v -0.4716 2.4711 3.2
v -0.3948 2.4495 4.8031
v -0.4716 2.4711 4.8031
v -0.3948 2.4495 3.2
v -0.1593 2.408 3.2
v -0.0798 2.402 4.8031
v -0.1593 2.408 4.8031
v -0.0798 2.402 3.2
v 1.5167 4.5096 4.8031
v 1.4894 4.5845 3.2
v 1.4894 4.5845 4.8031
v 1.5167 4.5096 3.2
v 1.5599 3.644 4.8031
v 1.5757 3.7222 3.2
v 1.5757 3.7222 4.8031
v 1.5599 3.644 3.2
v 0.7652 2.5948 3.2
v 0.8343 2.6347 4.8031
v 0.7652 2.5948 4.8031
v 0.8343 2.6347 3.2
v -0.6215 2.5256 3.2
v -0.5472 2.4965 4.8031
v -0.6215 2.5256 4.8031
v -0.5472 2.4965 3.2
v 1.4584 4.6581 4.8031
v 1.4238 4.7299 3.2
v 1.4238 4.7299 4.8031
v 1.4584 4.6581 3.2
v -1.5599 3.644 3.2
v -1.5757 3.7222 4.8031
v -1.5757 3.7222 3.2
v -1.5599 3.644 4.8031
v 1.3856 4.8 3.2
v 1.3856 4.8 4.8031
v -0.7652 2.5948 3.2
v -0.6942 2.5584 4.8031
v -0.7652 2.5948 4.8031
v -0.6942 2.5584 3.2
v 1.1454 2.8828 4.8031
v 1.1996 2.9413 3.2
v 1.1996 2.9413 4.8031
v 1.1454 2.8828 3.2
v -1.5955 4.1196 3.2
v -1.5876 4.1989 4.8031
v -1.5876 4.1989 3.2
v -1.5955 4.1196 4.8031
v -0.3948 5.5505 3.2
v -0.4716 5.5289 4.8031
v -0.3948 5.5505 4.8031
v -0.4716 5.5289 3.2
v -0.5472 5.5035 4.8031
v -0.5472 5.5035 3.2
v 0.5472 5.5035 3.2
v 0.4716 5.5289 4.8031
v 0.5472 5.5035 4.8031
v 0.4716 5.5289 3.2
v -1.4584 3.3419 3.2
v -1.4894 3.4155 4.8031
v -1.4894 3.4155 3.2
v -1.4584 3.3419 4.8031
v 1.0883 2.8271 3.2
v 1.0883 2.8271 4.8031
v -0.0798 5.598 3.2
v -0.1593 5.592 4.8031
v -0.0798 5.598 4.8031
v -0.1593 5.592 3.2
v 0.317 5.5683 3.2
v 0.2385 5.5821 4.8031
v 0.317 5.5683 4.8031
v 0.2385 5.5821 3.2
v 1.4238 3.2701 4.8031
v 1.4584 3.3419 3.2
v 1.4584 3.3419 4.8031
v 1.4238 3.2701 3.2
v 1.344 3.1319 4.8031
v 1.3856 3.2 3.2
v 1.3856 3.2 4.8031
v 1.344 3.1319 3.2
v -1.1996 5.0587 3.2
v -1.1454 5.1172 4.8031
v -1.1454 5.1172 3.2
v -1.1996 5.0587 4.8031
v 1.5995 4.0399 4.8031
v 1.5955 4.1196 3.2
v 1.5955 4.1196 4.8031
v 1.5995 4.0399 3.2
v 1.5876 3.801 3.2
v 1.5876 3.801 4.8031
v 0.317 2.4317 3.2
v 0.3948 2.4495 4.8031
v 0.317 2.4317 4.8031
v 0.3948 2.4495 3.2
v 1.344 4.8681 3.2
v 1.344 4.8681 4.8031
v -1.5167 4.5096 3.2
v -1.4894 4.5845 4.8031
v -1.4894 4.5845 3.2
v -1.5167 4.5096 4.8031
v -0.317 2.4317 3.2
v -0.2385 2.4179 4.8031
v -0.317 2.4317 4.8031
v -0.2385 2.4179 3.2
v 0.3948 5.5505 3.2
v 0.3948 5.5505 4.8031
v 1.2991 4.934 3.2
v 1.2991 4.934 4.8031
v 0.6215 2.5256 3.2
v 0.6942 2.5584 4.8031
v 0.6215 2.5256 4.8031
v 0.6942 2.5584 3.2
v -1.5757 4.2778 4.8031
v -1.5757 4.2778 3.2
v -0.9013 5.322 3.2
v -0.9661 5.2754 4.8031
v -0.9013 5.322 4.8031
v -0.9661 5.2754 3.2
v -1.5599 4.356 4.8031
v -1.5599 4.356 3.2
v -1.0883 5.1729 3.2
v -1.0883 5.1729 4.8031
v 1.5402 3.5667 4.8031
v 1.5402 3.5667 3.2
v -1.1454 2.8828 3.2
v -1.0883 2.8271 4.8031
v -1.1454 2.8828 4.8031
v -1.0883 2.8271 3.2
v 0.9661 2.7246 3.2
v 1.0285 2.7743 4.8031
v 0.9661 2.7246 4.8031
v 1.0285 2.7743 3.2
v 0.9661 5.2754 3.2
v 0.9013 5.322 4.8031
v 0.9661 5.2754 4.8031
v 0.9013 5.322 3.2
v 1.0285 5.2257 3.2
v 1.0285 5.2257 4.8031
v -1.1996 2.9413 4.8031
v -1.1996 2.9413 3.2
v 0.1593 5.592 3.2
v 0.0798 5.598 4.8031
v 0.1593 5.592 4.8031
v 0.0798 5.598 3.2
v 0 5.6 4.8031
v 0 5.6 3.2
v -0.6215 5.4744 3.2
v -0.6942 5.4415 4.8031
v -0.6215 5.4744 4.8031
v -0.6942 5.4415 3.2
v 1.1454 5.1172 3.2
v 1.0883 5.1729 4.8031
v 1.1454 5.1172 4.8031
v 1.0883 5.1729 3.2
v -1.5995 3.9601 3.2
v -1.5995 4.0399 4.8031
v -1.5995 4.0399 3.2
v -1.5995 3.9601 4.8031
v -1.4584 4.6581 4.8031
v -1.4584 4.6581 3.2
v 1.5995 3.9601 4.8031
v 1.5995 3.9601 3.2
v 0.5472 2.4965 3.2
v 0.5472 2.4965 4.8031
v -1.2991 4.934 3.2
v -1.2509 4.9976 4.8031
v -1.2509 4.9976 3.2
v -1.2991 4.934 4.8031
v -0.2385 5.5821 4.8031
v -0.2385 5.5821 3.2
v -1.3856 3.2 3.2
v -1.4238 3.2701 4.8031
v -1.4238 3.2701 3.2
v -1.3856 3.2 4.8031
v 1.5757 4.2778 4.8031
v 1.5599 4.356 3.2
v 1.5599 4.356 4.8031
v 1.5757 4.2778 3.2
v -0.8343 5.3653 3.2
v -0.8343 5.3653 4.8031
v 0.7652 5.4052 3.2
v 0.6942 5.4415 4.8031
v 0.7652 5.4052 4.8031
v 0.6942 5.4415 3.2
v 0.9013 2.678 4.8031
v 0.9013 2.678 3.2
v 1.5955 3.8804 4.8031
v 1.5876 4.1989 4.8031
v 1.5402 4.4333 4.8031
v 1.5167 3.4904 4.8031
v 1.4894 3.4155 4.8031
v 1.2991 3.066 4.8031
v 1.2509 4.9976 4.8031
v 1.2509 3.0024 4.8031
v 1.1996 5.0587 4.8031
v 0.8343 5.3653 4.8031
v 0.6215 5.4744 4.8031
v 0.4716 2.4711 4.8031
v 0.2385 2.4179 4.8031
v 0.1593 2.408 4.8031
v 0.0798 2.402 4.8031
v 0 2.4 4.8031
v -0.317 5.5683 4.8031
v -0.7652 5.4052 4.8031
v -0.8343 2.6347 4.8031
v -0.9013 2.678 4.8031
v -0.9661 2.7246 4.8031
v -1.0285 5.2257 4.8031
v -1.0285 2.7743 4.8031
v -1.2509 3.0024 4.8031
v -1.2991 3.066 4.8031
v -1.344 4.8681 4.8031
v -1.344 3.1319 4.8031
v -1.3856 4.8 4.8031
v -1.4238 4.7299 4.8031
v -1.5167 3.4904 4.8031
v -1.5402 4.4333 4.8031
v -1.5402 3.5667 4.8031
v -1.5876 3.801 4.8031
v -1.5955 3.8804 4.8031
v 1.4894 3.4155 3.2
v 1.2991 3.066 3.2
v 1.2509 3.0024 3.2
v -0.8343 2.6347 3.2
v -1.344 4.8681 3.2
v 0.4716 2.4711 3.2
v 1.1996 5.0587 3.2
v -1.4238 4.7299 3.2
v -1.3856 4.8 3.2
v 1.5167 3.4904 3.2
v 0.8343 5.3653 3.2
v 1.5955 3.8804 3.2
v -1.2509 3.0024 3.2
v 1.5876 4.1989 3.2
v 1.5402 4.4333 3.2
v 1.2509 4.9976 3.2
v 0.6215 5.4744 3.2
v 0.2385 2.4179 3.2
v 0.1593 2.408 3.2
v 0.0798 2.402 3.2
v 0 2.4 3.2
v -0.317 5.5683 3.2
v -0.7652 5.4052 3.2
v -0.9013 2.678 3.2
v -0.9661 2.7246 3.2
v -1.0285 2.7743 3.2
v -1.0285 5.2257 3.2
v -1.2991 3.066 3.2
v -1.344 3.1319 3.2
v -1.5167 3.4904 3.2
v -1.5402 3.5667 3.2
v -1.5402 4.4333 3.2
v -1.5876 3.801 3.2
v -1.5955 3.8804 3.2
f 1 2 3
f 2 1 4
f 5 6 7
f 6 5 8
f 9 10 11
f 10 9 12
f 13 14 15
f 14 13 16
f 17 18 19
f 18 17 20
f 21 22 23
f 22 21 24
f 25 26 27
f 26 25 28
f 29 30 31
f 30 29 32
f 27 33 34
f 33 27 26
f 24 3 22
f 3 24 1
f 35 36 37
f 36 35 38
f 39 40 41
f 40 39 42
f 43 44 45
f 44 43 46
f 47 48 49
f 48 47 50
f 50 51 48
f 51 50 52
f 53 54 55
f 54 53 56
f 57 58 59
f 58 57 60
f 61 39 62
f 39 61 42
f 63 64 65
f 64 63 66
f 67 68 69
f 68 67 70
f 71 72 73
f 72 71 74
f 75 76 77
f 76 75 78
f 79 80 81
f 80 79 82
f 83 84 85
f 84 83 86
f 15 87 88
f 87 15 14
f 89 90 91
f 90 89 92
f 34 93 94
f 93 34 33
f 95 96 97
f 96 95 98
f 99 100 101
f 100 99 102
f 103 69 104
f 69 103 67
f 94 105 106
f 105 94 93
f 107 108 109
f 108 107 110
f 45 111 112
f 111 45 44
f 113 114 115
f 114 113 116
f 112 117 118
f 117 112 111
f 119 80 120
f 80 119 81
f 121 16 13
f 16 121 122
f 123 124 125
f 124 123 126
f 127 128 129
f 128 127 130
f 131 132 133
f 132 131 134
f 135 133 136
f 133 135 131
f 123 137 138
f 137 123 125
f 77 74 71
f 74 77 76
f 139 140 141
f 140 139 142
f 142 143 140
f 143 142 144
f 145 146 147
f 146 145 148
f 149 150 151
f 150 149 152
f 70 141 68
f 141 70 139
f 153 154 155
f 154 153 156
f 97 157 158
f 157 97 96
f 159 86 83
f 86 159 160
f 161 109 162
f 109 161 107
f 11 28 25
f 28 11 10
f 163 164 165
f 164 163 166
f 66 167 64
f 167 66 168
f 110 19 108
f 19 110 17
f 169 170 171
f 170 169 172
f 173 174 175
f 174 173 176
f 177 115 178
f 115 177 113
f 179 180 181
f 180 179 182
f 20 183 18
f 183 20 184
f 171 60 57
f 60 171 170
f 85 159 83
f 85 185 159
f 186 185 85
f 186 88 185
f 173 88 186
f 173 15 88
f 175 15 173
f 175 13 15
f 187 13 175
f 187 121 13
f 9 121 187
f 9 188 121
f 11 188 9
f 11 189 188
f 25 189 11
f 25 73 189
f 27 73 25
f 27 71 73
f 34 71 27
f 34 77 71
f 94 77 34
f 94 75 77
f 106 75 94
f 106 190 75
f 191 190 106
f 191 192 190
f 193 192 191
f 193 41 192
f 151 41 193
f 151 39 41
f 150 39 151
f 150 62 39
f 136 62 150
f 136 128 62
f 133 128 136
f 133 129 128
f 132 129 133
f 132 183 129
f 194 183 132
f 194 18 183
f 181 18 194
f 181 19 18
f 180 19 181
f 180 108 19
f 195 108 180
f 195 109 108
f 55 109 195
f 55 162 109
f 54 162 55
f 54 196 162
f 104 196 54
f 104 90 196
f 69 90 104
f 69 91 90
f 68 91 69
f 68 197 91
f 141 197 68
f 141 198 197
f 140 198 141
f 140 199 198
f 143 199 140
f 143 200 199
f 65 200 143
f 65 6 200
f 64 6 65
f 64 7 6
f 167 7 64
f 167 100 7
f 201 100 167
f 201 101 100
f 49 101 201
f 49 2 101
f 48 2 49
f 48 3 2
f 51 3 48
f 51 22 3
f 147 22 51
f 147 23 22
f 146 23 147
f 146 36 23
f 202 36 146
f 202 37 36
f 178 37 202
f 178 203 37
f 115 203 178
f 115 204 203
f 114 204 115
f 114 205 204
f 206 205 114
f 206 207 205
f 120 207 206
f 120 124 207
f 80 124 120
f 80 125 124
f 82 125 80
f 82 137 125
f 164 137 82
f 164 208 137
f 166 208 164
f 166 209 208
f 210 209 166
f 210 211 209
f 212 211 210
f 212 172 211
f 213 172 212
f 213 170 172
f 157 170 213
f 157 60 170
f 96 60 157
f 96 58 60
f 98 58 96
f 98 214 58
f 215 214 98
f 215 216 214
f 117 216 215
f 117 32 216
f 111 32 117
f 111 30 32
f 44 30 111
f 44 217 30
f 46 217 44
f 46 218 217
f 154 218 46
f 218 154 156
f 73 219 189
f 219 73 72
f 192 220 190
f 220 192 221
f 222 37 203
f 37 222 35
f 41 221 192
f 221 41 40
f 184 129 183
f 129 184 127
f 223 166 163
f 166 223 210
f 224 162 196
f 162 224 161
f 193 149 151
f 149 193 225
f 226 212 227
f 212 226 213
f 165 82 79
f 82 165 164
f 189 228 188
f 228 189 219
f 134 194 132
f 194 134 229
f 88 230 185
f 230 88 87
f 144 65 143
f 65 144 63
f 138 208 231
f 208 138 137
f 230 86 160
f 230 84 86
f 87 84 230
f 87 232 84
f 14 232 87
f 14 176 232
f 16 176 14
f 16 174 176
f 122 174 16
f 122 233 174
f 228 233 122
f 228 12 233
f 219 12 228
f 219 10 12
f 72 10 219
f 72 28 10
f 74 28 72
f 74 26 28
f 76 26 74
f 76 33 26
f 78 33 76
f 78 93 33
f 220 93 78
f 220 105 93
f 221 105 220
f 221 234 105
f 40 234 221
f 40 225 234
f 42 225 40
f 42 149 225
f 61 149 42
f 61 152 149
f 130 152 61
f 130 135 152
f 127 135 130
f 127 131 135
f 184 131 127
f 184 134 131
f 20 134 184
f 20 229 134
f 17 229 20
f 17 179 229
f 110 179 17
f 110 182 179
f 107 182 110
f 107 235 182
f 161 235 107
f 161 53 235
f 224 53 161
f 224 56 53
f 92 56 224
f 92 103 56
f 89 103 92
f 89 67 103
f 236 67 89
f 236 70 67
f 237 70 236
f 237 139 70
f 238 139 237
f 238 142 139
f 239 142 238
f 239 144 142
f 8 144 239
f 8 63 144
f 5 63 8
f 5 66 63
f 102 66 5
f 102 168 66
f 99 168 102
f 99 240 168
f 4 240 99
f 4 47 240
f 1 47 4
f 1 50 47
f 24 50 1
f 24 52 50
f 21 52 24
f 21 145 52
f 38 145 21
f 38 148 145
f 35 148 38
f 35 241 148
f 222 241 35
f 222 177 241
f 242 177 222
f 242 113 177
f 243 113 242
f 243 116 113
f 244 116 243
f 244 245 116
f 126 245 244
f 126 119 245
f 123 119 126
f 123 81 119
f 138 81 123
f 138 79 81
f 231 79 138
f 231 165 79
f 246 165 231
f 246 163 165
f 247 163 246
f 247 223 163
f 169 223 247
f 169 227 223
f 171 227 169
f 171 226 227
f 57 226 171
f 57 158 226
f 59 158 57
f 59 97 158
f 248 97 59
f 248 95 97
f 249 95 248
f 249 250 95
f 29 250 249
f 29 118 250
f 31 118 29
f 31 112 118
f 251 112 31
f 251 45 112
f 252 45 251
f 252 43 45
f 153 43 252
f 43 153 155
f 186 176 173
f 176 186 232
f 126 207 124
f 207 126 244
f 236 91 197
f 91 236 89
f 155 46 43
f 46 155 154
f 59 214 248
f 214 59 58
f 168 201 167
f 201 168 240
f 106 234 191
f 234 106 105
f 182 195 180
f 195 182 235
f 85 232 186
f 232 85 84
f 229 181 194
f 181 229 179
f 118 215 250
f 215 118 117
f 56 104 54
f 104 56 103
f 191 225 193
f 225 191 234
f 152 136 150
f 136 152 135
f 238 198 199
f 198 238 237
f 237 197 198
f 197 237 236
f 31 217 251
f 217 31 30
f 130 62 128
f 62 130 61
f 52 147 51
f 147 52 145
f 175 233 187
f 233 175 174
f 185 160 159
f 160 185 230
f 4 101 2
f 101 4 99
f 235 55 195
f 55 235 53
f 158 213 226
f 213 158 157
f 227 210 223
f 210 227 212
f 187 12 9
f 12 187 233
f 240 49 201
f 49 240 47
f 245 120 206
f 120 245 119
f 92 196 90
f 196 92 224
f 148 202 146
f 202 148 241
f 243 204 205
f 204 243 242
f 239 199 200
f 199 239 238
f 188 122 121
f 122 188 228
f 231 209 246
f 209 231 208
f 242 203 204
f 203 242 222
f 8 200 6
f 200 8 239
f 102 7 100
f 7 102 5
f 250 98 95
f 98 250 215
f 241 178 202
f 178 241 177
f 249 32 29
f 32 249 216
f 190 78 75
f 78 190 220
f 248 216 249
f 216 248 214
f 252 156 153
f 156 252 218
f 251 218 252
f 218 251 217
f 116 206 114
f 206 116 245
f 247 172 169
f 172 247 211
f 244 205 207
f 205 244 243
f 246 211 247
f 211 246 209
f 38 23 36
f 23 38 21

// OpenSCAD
use <../lib.scad>
use <s/15068s01.scad>
$fa=1; $fs=0.2;
function ldraw_lib__15068p05(realsolid=false) = [
// 0 Slope Brick Curved  2 x  2 x  0.667 with "MUSEUM" Pattern
// 0 Name: 15068p05.dat
// 0 Author: Philippe Hurbain [Philo]
// 0 !LDRAW_ORG Part UPDATE 2017-01
// 0 !LICENSE Licensed under CC BY 2.0 and CC BY 4.0 : see CAreadme.txt
// 
// 0 BFC CERTIFY CCW
  [0,"BFC","CERTIFY"],
  [0,"BFC","CCW"],
// 
// 0 !KEYWORDS Architecture, Set 21035, Solomon Guggenheim
// 
// 0 !HISTORY 2017-12-30 [PTadmin] Official Update 2017-01
// 
// 
// 1 16 0 0 0 1 0 0 0 1 0 0 0 1 s\15068s01.dat
  [1,16,0,0,0,1,0,0,0,1,0,0,0,1, ldraw_lib__s__15068s01(realsolid)],
// 5 24 20 -4 -20 10 -4 -20 20 -7.532 -14.436 20 24.972 -60
  [5,24,20,-4,-20,10,-4,-20,20,-7.532,-14.436,20,24.972,-60],
// 5 24 20 -7.532 -14.436 10 -7.532 -14.436 20 -10.51 -8.284 20 -4 -20
  [5,24,20,-7.532,-14.436,10,-7.532,-14.436,20,-10.51,-8.284,20,-4,-20],
// 5 24 20 -10.51 -8.284 10 -10.51 -8.284 20 -12.883 -1.648 20 -7.532 -14.436
  [5,24,20,-10.51,-8.284,10,-10.51,-8.284,20,-12.883,-1.648,20,-7.532,-14.436],
// 5 24 20 -12.883 -1.648 10 -12.883 -1.648 20 -14.604 5.36 20 -10.51 -8.284
  [5,24,20,-12.883,-1.648,10,-12.883,-1.648,20,-14.604,5.36,20,-10.51,-8.284],
// 5 24 20 -14.604 5.36 10 -14.604 5.36 20 -15.652 12.616 20 -12.883 -1.648
  [5,24,20,-14.604,5.36,10,-14.604,5.36,20,-15.652,12.616,20,-12.883,-1.648],
// 5 24 20 -15.652 12.616 10 -15.652 12.616 20 -16 20 20 -14.604 5.36
  [5,24,20,-15.652,12.616,10,-15.652,12.616,20,-16,20,20,-14.604,5.36],
// 5 24 20 -16 20 10 -16 20 20 -15.652 27.384 20 -15.652 12.616
  [5,24,20,-16,20,10,-16,20,20,-15.652,27.384,20,-15.652,12.616],
// 4 0 12.329 -9.874 -9.597 12.329 -9.632 -10.097 15.229 -9.632 -10.097 15.199 -9.874 -9.597
  [4,0,12.329,-9.874,-9.597,12.329,-9.632,-10.097,15.229,-9.632,-10.097,15.199,-9.874,-9.597],
// 4 0 15.229 -10.784 -7.517 15.199 -10.605 -8.017 15.43 -10.59 -8.061 15.594 -10.744 -7.629
  [4,0,15.229,-10.784,-7.517,15.199,-10.605,-8.017,15.43,-10.59,-8.061,15.594,-10.744,-7.629],
// 4 0 15.594 -10.744 -7.629 15.43 -10.59 -8.061 15.656 -10.51 -8.284 15.953 -10.645 -7.905
  [4,0,15.594,-10.744,-7.629,15.43,-10.59,-8.061,15.656,-10.51,-8.284,15.953,-10.645,-7.905],
// 4 0 16.15 -10.51 -8.284 15.757 -10.406 -8.498 15.803 -10.257 -8.807 16.232 -10.257 -8.807
  [4,0,16.15,-10.51,-8.284,15.757,-10.406,-8.498,15.803,-10.257,-8.807,16.232,-10.257,-8.807],
// 4 0 16.232 -10.257 -8.807 15.803 -10.257 -8.807 15.757 -10.107 -9.116 16.16 -10.021 -9.295
  [4,0,16.232,-10.257,-8.807,15.803,-10.257,-8.807,15.757,-10.107,-9.116,16.16,-10.021,-9.295],
// 4 0 16.16 -10.021 -9.295 15.757 -10.107 -9.116 15.626 -9.98 -9.378 15.953 -9.82 -9.708
  [4,0,16.16,-10.021,-9.295,15.757,-10.107,-9.116,15.626,-9.98,-9.378,15.953,-9.82,-9.708],
// 4 0 15.953 -9.82 -9.708 15.626 -9.98 -9.378 15.43 -9.896 -9.553 15.594 -9.687 -9.985
  [4,0,15.953,-9.82,-9.708,15.626,-9.98,-9.378,15.43,-9.896,-9.553,15.594,-9.687,-9.985],
// 4 0 15.594 -9.687 -9.985 15.43 -9.896 -9.553 15.199 -9.874 -9.597 15.229 -9.632 -10.097
  [4,0,15.594,-9.687,-9.985,15.43,-9.896,-9.553,15.199,-9.874,-9.597,15.229,-9.632,-10.097],
// 4 0 12.329 -10.605 -8.017 15.199 -10.605 -8.017 15.229 -10.784 -7.517 12.329 -10.784 -7.517
  [4,0,12.329,-10.605,-8.017,15.199,-10.605,-8.017,15.229,-10.784,-7.517,12.329,-10.784,-7.517],
// 4 0 13.847 -6.255 -16.447 12.361 -6.033 -16.797 16.129 -5.779 -17.197 16.129 -6.097 -16.697
  [4,0,13.847,-6.255,-16.447,12.361,-6.033,-16.797,16.129,-5.779,-17.197,16.129,-6.097,-16.697],
// 4 0 15.174 -7.112 -15.097 12.361 -6.033 -16.797 13.847 -6.255 -16.447 16.129 -7.112 -15.097
  [4,0,15.174,-7.112,-15.097,12.361,-6.033,-16.797,13.847,-6.255,-16.447,16.129,-7.112,-15.097],
// 3 16 16.129 -7.112 -15.097 13.847 -6.255 -16.447 16.129 -6.097 -16.697
  [3,16,16.129,-7.112,-15.097,13.847,-6.255,-16.447,16.129,-6.097,-16.697],
// 4 0 16.129 -8.228 -12.997 12.361 -8.035 -13.397 13.847 -7.865 -13.747 16.129 -7.986 -13.497
  [4,0,16.129,-8.228,-12.997,12.361,-8.035,-13.397,13.847,-7.865,-13.747,16.129,-7.986,-13.497],
// 4 0 13.429 -12.174 -3.631 13.206 -12.19 -3.586 13.025 -12.033 -4.023 13.429 -12.005 -4.104
  [4,0,13.429,-12.174,-3.631,13.206,-12.19,-3.586,13.025,-12.033,-4.023,13.429,-12.005,-4.104],
// 4 0 13.653 -12.19 -3.586 13.429 -12.174 -3.631 13.429 -12.005 -4.104 13.834 -12.033 -4.023
  [4,0,13.653,-12.19,-3.586,13.429,-12.174,-3.631,13.429,-12.005,-4.104,13.834,-12.033,-4.023],
// 4 0 13.842 -12.235 -3.46 13.653 -12.19 -3.586 13.834 -12.033 -4.023 14.177 -12.115 -3.794
  [4,0,13.842,-12.235,-3.46,13.653,-12.19,-3.586,13.834,-12.033,-4.023,14.177,-12.115,-3.794],
// 4 0 12.89 -12.462 -2.823 13.016 -12.53 -2.634 12.682 -12.65 -2.299 12.453 -12.527 -2.642
  [4,0,12.89,-12.462,-2.823,13.016,-12.53,-2.634,12.682,-12.65,-2.299,12.453,-12.527,-2.642],
// 4 0 12.845 -12.383 -3.047 12.89 -12.462 -2.823 12.453 -12.527 -2.642 12.372 -12.383 -3.047
  [4,0,12.845,-12.383,-3.047,12.89,-12.462,-2.823,12.453,-12.527,-2.642,12.372,-12.383,-3.047],
// 4 0 12.89 -12.303 -3.27 12.845 -12.383 -3.047 12.372 -12.383 -3.047 12.453 -12.238 -3.451
  [4,0,12.89,-12.303,-3.27,12.845,-12.383,-3.047,12.372,-12.383,-3.047,12.453,-12.238,-3.451],
// 4 0 13.016 -12.235 -3.46 12.89 -12.303 -3.27 12.453 -12.238 -3.451 12.682 -12.115 -3.794
  [4,0,13.016,-12.235,-3.46,12.89,-12.303,-3.27,12.453,-12.238,-3.451,12.682,-12.115,-3.794],
// 4 0 13.206 -12.19 -3.586 13.016 -12.235 -3.46 12.682 -12.115 -3.794 13.025 -12.033 -4.023
  [4,0,13.206,-12.19,-3.586,13.016,-12.235,-3.46,12.682,-12.115,-3.794,13.025,-12.033,-4.023],
// 4 0 15.168 -12.479 -2.778 15.394 -12.467 -2.811 15.551 -12.626 -2.365 15.143 -12.647 -2.306
  [4,0,15.168,-12.479,-2.778,15.394,-12.467,-2.811,15.551,-12.626,-2.365,15.143,-12.647,-2.306],
// 4 0 14.947 -12.458 -2.834 15.168 -12.479 -2.778 15.143 -12.647 -2.306 14.744 -12.611 -2.407
  [4,0,14.947,-12.458,-2.834,15.168,-12.479,-2.778,15.143,-12.647,-2.306,14.744,-12.611,-2.407],
// 4 0 14.765 -12.41 -2.971 14.947 -12.458 -2.834 14.744 -12.611 -2.407 14.413 -12.523 -2.654
  [4,0,14.765,-12.41,-2.971,14.947,-12.458,-2.834,14.744,-12.611,-2.407,14.413,-12.523,-2.654],
// 4 0 15.749 -12.2 -3.556 15.633 -12.13 -3.752 15.984 -12.017 -4.069 16.195 -12.144 -3.714
  [4,0,15.749,-12.2,-3.556,15.633,-12.13,-3.752,15.984,-12.017,-4.069,16.195,-12.144,-3.714],
// 4 0 15.782 -12.281 -3.331 15.749 -12.2 -3.556 16.195 -12.144 -3.714 16.254 -12.29 -3.306
  [4,0,15.782,-12.281,-3.331,15.749,-12.2,-3.556,16.195,-12.144,-3.714,16.254,-12.29,-3.306],
// 4 0 15.726 -12.36 -3.11 15.782 -12.281 -3.331 16.254 -12.29 -3.306 16.153 -12.433 -2.906
  [4,0,15.726,-12.36,-3.11,15.782,-12.281,-3.331,16.254,-12.29,-3.306,16.153,-12.433,-2.906],
// 4 0 15.589 -12.425 -2.927 15.726 -12.36 -3.11 16.153 -12.433 -2.906 15.906 -12.551 -2.576
  [4,0,15.589,-12.425,-2.927,15.726,-12.36,-3.11,16.153,-12.433,-2.906,15.906,-12.551,-2.576],
// 4 0 15.394 -12.467 -2.811 15.589 -12.425 -2.927 15.906 -12.551 -2.576 15.551 -12.626 -2.365
  [4,0,15.394,-12.467,-2.811,15.589,-12.425,-2.927,15.906,-12.551,-2.576,15.551,-12.626,-2.365],
// 4 0 13.842 -12.235 -3.46 14.177 -12.115 -3.794 14.765 -12.41 -2.971 14.413 -12.523 -2.654
  [4,0,13.842,-12.235,-3.46,14.177,-12.115,-3.794,14.765,-12.41,-2.971,14.413,-12.523,-2.654],
// 4 16 13.842 -12.235 -3.46 13.016 -12.53 -2.634 12.89 -12.462 -2.823 13.653 -12.19 -3.586
  [4,16,13.842,-12.235,-3.46,13.016,-12.53,-2.634,12.89,-12.462,-2.823,13.653,-12.19,-3.586],
// 4 16 13.429 -12.174 -3.631 13.653 -12.19 -3.586 12.89 -12.462 -2.823 12.845 -12.383 -3.047
  [4,16,13.429,-12.174,-3.631,13.653,-12.19,-3.586,12.89,-12.462,-2.823,12.845,-12.383,-3.047],
// 4 16 13.206 -12.19 -3.586 13.429 -12.174 -3.631 12.845 -12.383 -3.047 13.016 -12.235 -3.46
  [4,16,13.206,-12.19,-3.586,13.429,-12.174,-3.631,12.845,-12.383,-3.047,13.016,-12.235,-3.46],
// 3 16 12.845 -12.383 -3.047 12.89 -12.303 -3.27 13.016 -12.235 -3.46
  [3,16,12.845,-12.383,-3.047,12.89,-12.303,-3.27,13.016,-12.235,-3.46],
// 3 16 13.016 -12.53 -2.634 13.842 -12.235 -3.46 14.413 -12.523 -2.654
  [3,16,13.016,-12.53,-2.634,13.842,-12.235,-3.46,14.413,-12.523,-2.654],
// 4 16 13.016 -12.53 -2.634 14.413 -12.523 -2.654 14.744 -12.611 -2.407 12.682 -12.65 -2.299
  [4,16,13.016,-12.53,-2.634,14.413,-12.523,-2.654,14.744,-12.611,-2.407,12.682,-12.65,-2.299],
// 3 16 12.682 -12.65 -2.299 14.744 -12.611 -2.407 15.143 -12.647 -2.306
  [3,16,12.682,-12.65,-2.299,14.744,-12.611,-2.407,15.143,-12.647,-2.306],
// 4 16 14.765 -12.41 -2.971 14.177 -12.115 -3.794 15.633 -12.13 -3.752 15.749 -12.2 -3.556
  [4,16,14.765,-12.41,-2.971,14.177,-12.115,-3.794,15.633,-12.13,-3.752,15.749,-12.2,-3.556],
// 4 16 15.633 -12.13 -3.752 14.177 -12.115 -3.794 13.834 -12.033 -4.023 15.984 -12.017 -4.069
  [4,16,15.633,-12.13,-3.752,14.177,-12.115,-3.794,13.834,-12.033,-4.023,15.984,-12.017,-4.069],
// 4 16 15.984 -12.017 -4.069 13.834 -12.033 -4.023 13.429 -12.005 -4.104 15.229 -10.784 -7.517
  [4,16,15.984,-12.017,-4.069,13.834,-12.033,-4.023,13.429,-12.005,-4.104,15.229,-10.784,-7.517],
// 4 16 14.765 -12.41 -2.971 15.749 -12.2 -3.556 15.782 -12.281 -3.331 14.947 -12.458 -2.834
  [4,16,14.765,-12.41,-2.971,15.749,-12.2,-3.556,15.782,-12.281,-3.331,14.947,-12.458,-2.834],
// 4 16 14.947 -12.458 -2.834 15.782 -12.281 -3.331 15.726 -12.36 -3.11 15.168 -12.479 -2.778
  [4,16,14.947,-12.458,-2.834,15.782,-12.281,-3.331,15.726,-12.36,-3.11,15.168,-12.479,-2.778],
// 4 16 15.168 -12.479 -2.778 15.726 -12.36 -3.11 15.589 -12.425 -2.927 15.394 -12.467 -2.811
  [4,16,15.168,-12.479,-2.778,15.726,-12.36,-3.11,15.589,-12.425,-2.927,15.394,-12.467,-2.811],
// 4 0 15.629 -14.27 4.003 15.629 -13.767 1.953 16.129 -13.644 1.453 16.129 -14.27 4.003
  [4,0,15.629,-14.27,4.003,15.629,-13.767,1.953,16.129,-13.644,1.453,16.129,-14.27,4.003],
// 4 0 13.929 -14.16 3.553 13.429 -14.16 3.553 13.429 -13.767 1.953 13.929 -13.767 1.953
  [4,0,13.929,-14.16,3.553,13.429,-14.16,3.553,13.429,-13.767,1.953,13.929,-13.767,1.953],
// 4 0 12.829 -14.27 4.003 12.329 -14.27 4.003 12.329 -13.644 1.453 12.829 -13.767 1.953
  [4,0,12.829,-14.27,4.003,12.329,-14.27,4.003,12.329,-13.644,1.453,12.829,-13.767,1.953],
// 4 0 13.429 -13.767 1.953 12.829 -13.767 1.953 12.329 -13.644 1.453 16.129 -13.644 1.453
  [4,0,13.429,-13.767,1.953,12.829,-13.767,1.953,12.329,-13.644,1.453,16.129,-13.644,1.453],
// 3 0 13.929 -13.767 1.953 13.429 -13.767 1.953 16.129 -13.644 1.453
  [3,0,13.929,-13.767,1.953,13.429,-13.767,1.953,16.129,-13.644,1.453],
// 3 0 15.629 -13.767 1.953 13.929 -13.767 1.953 16.129 -13.644 1.453
  [3,0,15.629,-13.767,1.953,13.929,-13.767,1.953,16.129,-13.644,1.453],
// 4 16 13.429 -14.16 3.553 12.829 -14.27 4.003 12.829 -13.767 1.953 13.429 -13.767 1.953
  [4,16,13.429,-14.16,3.553,12.829,-14.27,4.003,12.829,-13.767,1.953,13.429,-13.767,1.953],
// 4 16 12.829 -14.27 4.003 13.429 -14.16 3.553 13.929 -14.16 3.553 15.629 -14.27 4.003
  [4,16,12.829,-14.27,4.003,13.429,-14.16,3.553,13.929,-14.16,3.553,15.629,-14.27,4.003],
// 4 16 15.629 -14.27 4.003 13.929 -14.16 3.553 13.929 -13.767 1.953 15.629 -13.767 1.953
  [4,16,15.629,-14.27,4.003,13.929,-14.16,3.553,13.929,-13.767,1.953,15.629,-13.767,1.953],
// 4 0 12.329 -15 8.103 12.329 -14.928 7.603 15.229 -14.928 7.603 15.199 -15 8.103
  [4,0,12.329,-15,8.103,12.329,-14.928,7.603,15.229,-14.928,7.603,15.199,-15,8.103],
// 4 16 15.626 -15.197 9.464 15.43 -15.222 9.639 15.199 -15.228 9.683 15.757 -15.159 9.202
  [4,16,15.626,-15.197,9.464,15.43,-15.222,9.639,15.199,-15.228,9.683,15.757,-15.159,9.202],
// 4 16 15.803 -15.114 8.893 15.757 -15.159 9.202 15.199 -15.228 9.683 15.757 -15.07 8.584
  [4,16,15.803,-15.114,8.893,15.757,-15.159,9.202,15.199,-15.228,9.683,15.757,-15.07,8.584],
// 4 16 15.626 -15.032 8.322 15.757 -15.07 8.584 15.199 -15.228 9.683 15.43 -15.006 8.147
  [4,16,15.626,-15.032,8.322,15.757,-15.07,8.584,15.199,-15.228,9.683,15.43,-15.006,8.147],
// 4 16 15.199 -15 8.103 15.43 -15.006 8.147 15.199 -15.228 9.683 12.329 -15 8.103
  [4,16,15.199,-15,8.103,15.43,-15.006,8.147,15.199,-15.228,9.683,12.329,-15,8.103],
// 4 0 15.229 -15.301 10.183 15.199 -15.228 9.683 15.43 -15.222 9.639 15.594 -15.285 10.071
  [4,0,15.229,-15.301,10.183,15.199,-15.228,9.683,15.43,-15.222,9.639,15.594,-15.285,10.071],
// 4 0 15.594 -15.285 10.071 15.43 -15.222 9.639 15.626 -15.197 9.464 15.953 -15.245 9.795
  [4,0,15.594,-15.285,10.071,15.43,-15.222,9.639,15.626,-15.197,9.464,15.953,-15.245,9.795],
// 4 0 15.953 -15.245 9.795 15.626 -15.197 9.464 15.757 -15.159 9.202 16.16 -15.185 9.381
  [4,0,15.953,-15.245,9.795,15.626,-15.197,9.464,15.757,-15.159,9.202,16.16,-15.185,9.381],
// 4 0 16.16 -15.185 9.381 15.757 -15.159 9.202 15.803 -15.114 8.893 16.232 -15.114 8.893
  [4,0,16.16,-15.185,9.381,15.757,-15.159,9.202,15.803,-15.114,8.893,16.232,-15.114,8.893],
// 4 0 16.232 -15.114 8.893 15.803 -15.114 8.893 15.757 -15.07 8.584 16.16 -15.044 8.405
  [4,0,16.232,-15.114,8.893,15.803,-15.114,8.893,15.757,-15.07,8.584,16.16,-15.044,8.405],
// 4 0 16.16 -15.044 8.405 15.757 -15.07 8.584 15.626 -15.032 8.322 15.953 -14.984 7.992
  [4,0,16.16,-15.044,8.405,15.757,-15.07,8.584,15.626,-15.032,8.322,15.953,-14.984,7.992],
// 4 0 15.953 -14.984 7.992 15.626 -15.032 8.322 15.43 -15.006 8.147 15.594 -14.944 7.715
  [4,0,15.953,-14.984,7.992,15.626,-15.032,8.322,15.43,-15.006,8.147,15.594,-14.944,7.715],
// 4 0 15.594 -14.944 7.715 15.43 -15.006 8.147 15.199 -15 8.103 15.229 -14.928 7.603
  [4,0,15.594,-14.944,7.715,15.43,-15.006,8.147,15.199,-15,8.103,15.229,-14.928,7.603],
// 4 0 12.329 -15.228 9.683 15.199 -15.228 9.683 15.229 -15.301 10.183 12.329 -15.301 10.183
  [4,0,12.329,-15.228,9.683,15.199,-15.228,9.683,15.229,-15.301,10.183,12.329,-15.301,10.183],
// 3 16 15.199 -15.228 9.683 12.329 -15.228 9.683 12.329 -15 8.103
  [3,16,15.199,-15.228,9.683,12.329,-15.228,9.683,12.329,-15,8.103],
// 4 0 13.847 -15.744 14.553 12.361 -15.727 14.203 16.129 -15.708 13.803 16.129 -15.732 14.303
  [4,0,13.847,-15.744,14.553,12.361,-15.727,14.203,16.129,-15.708,13.803,16.129,-15.732,14.303],
// 4 0 15.174 -15.807 15.903 12.361 -15.727 14.203 13.847 -15.744 14.553 16.129 -15.807 15.903
  [4,0,15.174,-15.807,15.903,12.361,-15.727,14.203,13.847,-15.744,14.553,16.129,-15.807,15.903],
// 3 16 16.129 -15.807 15.903 13.847 -15.744 14.553 16.129 -15.732 14.303
  [3,16,16.129,-15.807,15.903,13.847,-15.744,14.553,16.129,-15.732,14.303],
// 4 0 16.129 -15.906 18.003 12.361 -15.887 17.603 13.847 -15.871 17.253 16.129 -15.883 17.503
  [4,0,16.129,-15.906,18.003,12.361,-15.887,17.603,13.847,-15.871,17.253,16.129,-15.883,17.503],
// 4 0 13.847 -15.871 17.253 12.361 -15.887 17.603 15.174 -15.807 15.903 16.129 -15.807 15.903
  [4,0,13.847,-15.871,17.253,12.361,-15.887,17.603,15.174,-15.807,15.903,16.129,-15.807,15.903],
// 3 16 16.129 -15.883 17.503 13.847 -15.871 17.253 16.129 -15.807 15.903
  [3,16,16.129,-15.883,17.503,13.847,-15.871,17.253,16.129,-15.807,15.903],
// 3 16 12.361 -15.887 17.603 12.361 -15.727 14.203 15.174 -15.807 15.903
  [3,16,12.361,-15.887,17.603,12.361,-15.727,14.203,15.174,-15.807,15.903],
// 4 16 12.361 -15.727 14.203 12.361 -15.887 17.603 10 -16 20 10 -15.652 12.616
  [4,16,12.361,-15.727,14.203,12.361,-15.887,17.603,10,-16,20,10,-15.652,12.616],
// 4 16 16.129 -15.708 13.803 12.361 -15.727 14.203 10 -15.652 12.616 20 -15.652 12.616
  [4,16,16.129,-15.708,13.803,12.361,-15.727,14.203,10,-15.652,12.616,20,-15.652,12.616],
// 3 16 16.129 -15.732 14.303 16.129 -15.708 13.803 20 -15.652 12.616
  [3,16,16.129,-15.732,14.303,16.129,-15.708,13.803,20,-15.652,12.616],
// 4 16 16.129 -15.807 15.903 16.129 -15.732 14.303 20 -15.652 12.616 20 -16 20
  [4,16,16.129,-15.807,15.903,16.129,-15.732,14.303,20,-15.652,12.616,20,-16,20],
// 3 16 20 -16 20 16.129 -15.883 17.503 16.129 -15.807 15.903
  [3,16,20,-16,20,16.129,-15.883,17.503,16.129,-15.807,15.903],
// 3 16 20 -16 20 16.129 -15.906 18.003 16.129 -15.883 17.503
  [3,16,20,-16,20,16.129,-15.906,18.003,16.129,-15.883,17.503],
// 4 16 16.129 -15.906 18.003 20 -16 20 10 -16 20 12.361 -15.887 17.603
  [4,16,16.129,-15.906,18.003,20,-16,20,10,-16,20,12.361,-15.887,17.603],
// 3 16 10 -15.652 12.616 12.329 -15.228 9.683 12.329 -15.301 10.183
  [3,16,10,-15.652,12.616,12.329,-15.228,9.683,12.329,-15.301,10.183],
// 4 16 12.329 -15 8.103 12.329 -15.228 9.683 10 -15.652 12.616 10 -14.604 5.36
  [4,16,12.329,-15,8.103,12.329,-15.228,9.683,10,-15.652,12.616,10,-14.604,5.36],
// 3 16 12.329 -15 8.103 10 -14.604 5.36 12.329 -14.928 7.603
  [3,16,12.329,-15,8.103,10,-14.604,5.36,12.329,-14.928,7.603],
// 4 16 12.329 -14.928 7.603 10 -14.604 5.36 20 -14.604 5.36 15.229 -14.928 7.603
  [4,16,12.329,-14.928,7.603,10,-14.604,5.36,20,-14.604,5.36,15.229,-14.928,7.603],
// 3 16 15.594 -14.944 7.715 15.229 -14.928 7.603 20 -14.604 5.36
  [3,16,15.594,-14.944,7.715,15.229,-14.928,7.603,20,-14.604,5.36],
// 3 16 15.953 -14.984 7.992 15.594 -14.944 7.715 20 -14.604 5.36
  [3,16,15.953,-14.984,7.992,15.594,-14.944,7.715,20,-14.604,5.36],
// 3 16 16.16 -15.044 8.405 15.953 -14.984 7.992 20 -14.604 5.36
  [3,16,16.16,-15.044,8.405,15.953,-14.984,7.992,20,-14.604,5.36],
// 4 16 16.232 -15.114 8.893 16.16 -15.044 8.405 20 -14.604 5.36 20 -15.652 12.616
  [4,16,16.232,-15.114,8.893,16.16,-15.044,8.405,20,-14.604,5.36,20,-15.652,12.616],
// 3 16 20 -15.652 12.616 16.16 -15.185 9.381 16.232 -15.114 8.893
  [3,16,20,-15.652,12.616,16.16,-15.185,9.381,16.232,-15.114,8.893],
// 3 16 20 -15.652 12.616 15.953 -15.245 9.795 16.16 -15.185 9.381
  [3,16,20,-15.652,12.616,15.953,-15.245,9.795,16.16,-15.185,9.381],
// 3 16 20 -15.652 12.616 15.594 -15.285 10.071 15.953 -15.245 9.795
  [3,16,20,-15.652,12.616,15.594,-15.285,10.071,15.953,-15.245,9.795],
// 3 16 20 -15.652 12.616 15.229 -15.301 10.183 15.594 -15.285 10.071
  [3,16,20,-15.652,12.616,15.229,-15.301,10.183,15.594,-15.285,10.071],
// 4 16 12.329 -15.301 10.183 15.229 -15.301 10.183 20 -15.652 12.616 10 -15.652 12.616
  [4,16,12.329,-15.301,10.183,15.229,-15.301,10.183,20,-15.652,12.616,10,-15.652,12.616],
// 4 16 20 -14.604 5.36 10 -14.604 5.36 12.329 -14.27 4.003 12.829 -14.27 4.003
  [4,16,20,-14.604,5.36,10,-14.604,5.36,12.329,-14.27,4.003,12.829,-14.27,4.003],
// 3 16 20 -14.604 5.36 12.829 -14.27 4.003 15.629 -14.27 4.003
  [3,16,20,-14.604,5.36,12.829,-14.27,4.003,15.629,-14.27,4.003],
// 3 16 20 -14.604 5.36 15.629 -14.27 4.003 16.129 -14.27 4.003
  [3,16,20,-14.604,5.36,15.629,-14.27,4.003,16.129,-14.27,4.003],
// 4 16 20 -14.604 5.36 16.129 -14.27 4.003 16.129 -13.644 1.453 20 -12.883 -1.648
  [4,16,20,-14.604,5.36,16.129,-14.27,4.003,16.129,-13.644,1.453,20,-12.883,-1.648],
// 4 16 20 -12.883 -1.648 16.129 -13.644 1.453 12.329 -13.644 1.453 10 -12.883 -1.648
  [4,16,20,-12.883,-1.648,16.129,-13.644,1.453,12.329,-13.644,1.453,10,-12.883,-1.648],
// 4 16 10 -14.604 5.36 10 -12.883 -1.648 12.329 -13.644 1.453 12.329 -14.27 4.003
  [4,16,10,-14.604,5.36,10,-12.883,-1.648,12.329,-13.644,1.453,12.329,-14.27,4.003],
// 4 16 20 -12.883 -1.648 10 -12.883 -1.648 12.682 -12.65 -2.299 15.143 -12.647 -2.306
  [4,16,20,-12.883,-1.648,10,-12.883,-1.648,12.682,-12.65,-2.299,15.143,-12.647,-2.306],
// 3 16 20 -12.883 -1.648 15.143 -12.647 -2.306 15.551 -12.626 -2.365
  [3,16,20,-12.883,-1.648,15.143,-12.647,-2.306,15.551,-12.626,-2.365],
// 3 16 20 -12.883 -1.648 15.551 -12.626 -2.365 15.906 -12.551 -2.576
  [3,16,20,-12.883,-1.648,15.551,-12.626,-2.365,15.906,-12.551,-2.576],
// 3 16 20 -12.883 -1.648 15.906 -12.551 -2.576 16.153 -12.433 -2.906
  [3,16,20,-12.883,-1.648,15.906,-12.551,-2.576,16.153,-12.433,-2.906],
// 4 16 20 -12.883 -1.648 16.153 -12.433 -2.906 16.254 -12.29 -3.306 20 -10.51 -8.284
  [4,16,20,-12.883,-1.648,16.153,-12.433,-2.906,16.254,-12.29,-3.306,20,-10.51,-8.284],
// 3 16 16.254 -12.29 -3.306 16.195 -12.144 -3.714 20 -10.51 -8.284
  [3,16,16.254,-12.29,-3.306,16.195,-12.144,-3.714,20,-10.51,-8.284],
// 4 16 20 -10.51 -8.284 16.195 -12.144 -3.714 15.984 -12.017 -4.069 15.953 -10.645 -7.905
  [4,16,20,-10.51,-8.284,16.195,-12.144,-3.714,15.984,-12.017,-4.069,15.953,-10.645,-7.905],
// 3 16 10 -12.883 -1.648 12.453 -12.527 -2.642 12.682 -12.65 -2.299
  [3,16,10,-12.883,-1.648,12.453,-12.527,-2.642,12.682,-12.65,-2.299],
// 3 16 10 -12.883 -1.648 12.372 -12.383 -3.047 12.453 -12.527 -2.642
  [3,16,10,-12.883,-1.648,12.372,-12.383,-3.047,12.453,-12.527,-2.642],
// 3 16 10 -12.883 -1.648 12.453 -12.238 -3.451 12.372 -12.383 -3.047
  [3,16,10,-12.883,-1.648,12.453,-12.238,-3.451,12.372,-12.383,-3.047],
// 3 16 10 -12.883 -1.648 12.682 -12.115 -3.794 12.453 -12.238 -3.451
  [3,16,10,-12.883,-1.648,12.682,-12.115,-3.794,12.453,-12.238,-3.451],
// 3 16 10 -12.883 -1.648 13.025 -12.033 -4.023 12.682 -12.115 -3.794
  [3,16,10,-12.883,-1.648,13.025,-12.033,-4.023,12.682,-12.115,-3.794],
// 4 16 13.025 -12.033 -4.023 10 -12.883 -1.648 10 -10.51 -8.284 12.329 -10.784 -7.517
  [4,16,13.025,-12.033,-4.023,10,-12.883,-1.648,10,-10.51,-8.284,12.329,-10.784,-7.517],
// 3 0 16.15 -10.51 -8.284 15.656 -10.51 -8.284 15.757 -10.406 -8.498
  [3,0,16.15,-10.51,-8.284,15.656,-10.51,-8.284,15.757,-10.406,-8.498],
// 3 0 15.953 -10.645 -7.905 15.656 -10.51 -8.284 16.15 -10.51 -8.284
  [3,0,15.953,-10.645,-7.905,15.656,-10.51,-8.284,16.15,-10.51,-8.284],
// 4 16 15.199 -10.605 -8.017 12.329 -10.605 -8.017 15.656 -10.51 -8.284 15.43 -10.59 -8.061
  [4,16,15.199,-10.605,-8.017,12.329,-10.605,-8.017,15.656,-10.51,-8.284,15.43,-10.59,-8.061],
// 3 16 12.329 -10.605 -8.017 10 -10.51 -8.284 15.656 -10.51 -8.284
  [3,16,12.329,-10.605,-8.017,10,-10.51,-8.284,15.656,-10.51,-8.284],
// 3 16 12.329 -10.784 -7.517 10 -10.51 -8.284 12.329 -10.605 -8.017
  [3,16,12.329,-10.784,-7.517,10,-10.51,-8.284,12.329,-10.605,-8.017],
// 4 16 13.429 -12.005 -4.104 13.025 -12.033 -4.023 12.329 -10.784 -7.517 15.229 -10.784 -7.517
  [4,16,13.429,-12.005,-4.104,13.025,-12.033,-4.023,12.329,-10.784,-7.517,15.229,-10.784,-7.517],
// 3 16 15.984 -12.017 -4.069 15.229 -10.784 -7.517 15.594 -10.744 -7.629
  [3,16,15.984,-12.017,-4.069,15.229,-10.784,-7.517,15.594,-10.744,-7.629],
// 3 16 15.984 -12.017 -4.069 15.594 -10.744 -7.629 15.953 -10.645 -7.905
  [3,16,15.984,-12.017,-4.069,15.594,-10.744,-7.629,15.953,-10.645,-7.905],
// 3 16 15.953 -10.645 -7.905 16.15 -10.51 -8.284 20 -10.51 -8.284
  [3,16,15.953,-10.645,-7.905,16.15,-10.51,-8.284,20,-10.51,-8.284],
// 3 16 20 -10.51 -8.284 16.15 -10.51 -8.284 16.232 -10.257 -8.807
  [3,16,20,-10.51,-8.284,16.15,-10.51,-8.284,16.232,-10.257,-8.807],
// 4 16 20 -10.51 -8.284 16.232 -10.257 -8.807 16.16 -10.021 -9.295 20 -7.532 -14.436
  [4,16,20,-10.51,-8.284,16.232,-10.257,-8.807,16.16,-10.021,-9.295,20,-7.532,-14.436],
// 4 16 15.803 -10.257 -8.807 15.757 -10.406 -8.498 15.656 -10.51 -8.284 12.329 -9.874 -9.597
  [4,16,15.803,-10.257,-8.807,15.757,-10.406,-8.498,15.656,-10.51,-8.284,12.329,-9.874,-9.597],
// 4 16 15.757 -10.107 -9.116 15.803 -10.257 -8.807 12.329 -9.874 -9.597 15.626 -9.98 -9.378
  [4,16,15.757,-10.107,-9.116,15.803,-10.257,-8.807,12.329,-9.874,-9.597,15.626,-9.98,-9.378],
// 4 16 15.626 -9.98 -9.378 12.329 -9.874 -9.597 15.199 -9.874 -9.597 15.43 -9.896 -9.553
  [4,16,15.626,-9.98,-9.378,12.329,-9.874,-9.597,15.199,-9.874,-9.597,15.43,-9.896,-9.553],
// 3 16 15.656 -10.51 -8.284 10 -10.51 -8.284 12.329 -9.874 -9.597
  [3,16,15.656,-10.51,-8.284,10,-10.51,-8.284,12.329,-9.874,-9.597],
// 3 16 10 -10.51 -8.284 12.329 -9.632 -10.097 12.329 -9.874 -9.597
  [3,16,10,-10.51,-8.284,12.329,-9.632,-10.097,12.329,-9.874,-9.597],
// 4 16 12.361 -8.035 -13.397 12.329 -9.632 -10.097 10 -10.51 -8.284 10 -7.532 -14.436
  [4,16,12.361,-8.035,-13.397,12.329,-9.632,-10.097,10,-10.51,-8.284,10,-7.532,-14.436],
// 4 16 15.229 -9.632 -10.097 12.329 -9.632 -10.097 12.361 -8.035 -13.397 16.129 -8.228 -12.997
  [4,16,15.229,-9.632,-10.097,12.329,-9.632,-10.097,12.361,-8.035,-13.397,16.129,-8.228,-12.997],
// 3 16 15.594 -9.687 -9.985 15.229 -9.632 -10.097 16.129 -8.228 -12.997
  [3,16,15.594,-9.687,-9.985,15.229,-9.632,-10.097,16.129,-8.228,-12.997],
// 4 16 15.953 -9.82 -9.708 15.594 -9.687 -9.985 16.129 -8.228 -12.997 20 -7.532 -14.436
  [4,16,15.953,-9.82,-9.708,15.594,-9.687,-9.985,16.129,-8.228,-12.997,20,-7.532,-14.436],
// 3 16 16.16 -10.021 -9.295 15.953 -9.82 -9.708 20 -7.532 -14.436
  [3,16,16.16,-10.021,-9.295,15.953,-9.82,-9.708,20,-7.532,-14.436],
// 4 0 15.174 -7.112 -15.097 16.129 -7.112 -15.097 15.015 -7.532 -14.436 14.081 -7.532 -14.436
  [4,0,15.174,-7.112,-15.097,16.129,-7.112,-15.097,15.015,-7.532,-14.436,14.081,-7.532,-14.436],
// 4 0 14.081 -7.532 -14.436 15.015 -7.532 -14.436 13.847 -7.865 -13.747 12.361 -8.035 -13.397
  [4,0,14.081,-7.532,-14.436,15.015,-7.532,-14.436,13.847,-7.865,-13.747,12.361,-8.035,-13.397],
// 3 16 12.361 -8.035 -13.397 10 -7.532 -14.436 14.081 -7.532 -14.436
  [3,16,12.361,-8.035,-13.397,10,-7.532,-14.436,14.081,-7.532,-14.436],
// 4 16 15.174 -7.112 -15.097 14.081 -7.532 -14.436 10 -7.532 -14.436 12.361 -6.033 -16.797
  [4,16,15.174,-7.112,-15.097,14.081,-7.532,-14.436,10,-7.532,-14.436,12.361,-6.033,-16.797],
// 3 16 10 -7.532 -14.436 10 -4 -20 12.361 -6.033 -16.797
  [3,16,10,-7.532,-14.436,10,-4,-20,12.361,-6.033,-16.797],
// 4 16 12.361 -6.033 -16.797 10 -4 -20 20 -4 -20 16.129 -5.779 -17.197
  [4,16,12.361,-6.033,-16.797,10,-4,-20,20,-4,-20,16.129,-5.779,-17.197],
// 3 16 16.129 -6.097 -16.697 16.129 -5.779 -17.197 20 -4 -20
  [3,16,16.129,-6.097,-16.697,16.129,-5.779,-17.197,20,-4,-20],
// 4 16 16.129 -7.112 -15.097 16.129 -6.097 -16.697 20 -4 -20 20 -7.532 -14.436
  [4,16,16.129,-7.112,-15.097,16.129,-6.097,-16.697,20,-4,-20,20,-7.532,-14.436],
// 3 16 20 -7.532 -14.436 15.015 -7.532 -14.436 16.129 -7.112 -15.097
  [3,16,20,-7.532,-14.436,15.015,-7.532,-14.436,16.129,-7.112,-15.097],
// 4 16 15.015 -7.532 -14.436 20 -7.532 -14.436 16.129 -7.986 -13.497 13.847 -7.865 -13.747
  [4,16,15.015,-7.532,-14.436,20,-7.532,-14.436,16.129,-7.986,-13.497,13.847,-7.865,-13.747],
// 3 16 16.129 -8.228 -12.997 16.129 -7.986 -13.497 20 -7.532 -14.436
  [3,16,16.129,-8.228,-12.997,16.129,-7.986,-13.497,20,-7.532,-14.436],
// 4 16 10 -4 -20 10 -7.532 -14.436 -20 -7.532 -14.436 -20 -4 -20
  [4,16,10,-4,-20,10,-7.532,-14.436,-20,-7.532,-14.436,-20,-4,-20],
// 4 16 10 -7.532 -14.436 10 -10.51 -8.284 -20 -10.51 -8.284 -20 -7.532 -14.436
  [4,16,10,-7.532,-14.436,10,-10.51,-8.284,-20,-10.51,-8.284,-20,-7.532,-14.436],
// 4 16 10 -10.51 -8.284 10 -12.883 -1.648 -20 -12.883 -1.648 -20 -10.51 -8.284
  [4,16,10,-10.51,-8.284,10,-12.883,-1.648,-20,-12.883,-1.648,-20,-10.51,-8.284],
// 4 16 10 -12.883 -1.648 10 -14.604 5.36 -20 -14.604 5.36 -20 -12.883 -1.648
  [4,16,10,-12.883,-1.648,10,-14.604,5.36,-20,-14.604,5.36,-20,-12.883,-1.648],
// 4 16 -20 -14.604 5.36 10 -14.604 5.36 10 -15.652 12.616 -20 -15.652 12.616
  [4,16,-20,-14.604,5.36,10,-14.604,5.36,10,-15.652,12.616,-20,-15.652,12.616],
// 4 16 -20 -15.652 12.616 10 -15.652 12.616 10 -16 20 -20 -16 20
  [4,16,-20,-15.652,12.616,10,-15.652,12.616,10,-16,20,-20,-16,20],
// 5 24 10 -15.652 12.616 -20 -15.652 12.616 -20 -16 20 -20 -14.604 5.36
  [5,24,10,-15.652,12.616,-20,-15.652,12.616,-20,-16,20,-20,-14.604,5.36],
// 5 24 -20 -14.604 5.36 10 -14.604 5.36 -20 -15.652 12.616 -20 -12.883 -1.648
  [5,24,-20,-14.604,5.36,10,-14.604,5.36,-20,-15.652,12.616,-20,-12.883,-1.648],
// 5 24 -20 -12.883 -1.648 10 -12.883 -1.648 -20 -14.604 5.36 -20 -10.51 -8.284
  [5,24,-20,-12.883,-1.648,10,-12.883,-1.648,-20,-14.604,5.36,-20,-10.51,-8.284],
// 5 24 -20 -10.51 -8.284 10 -10.51 -8.284 -20 -12.883 -1.648 -20 -7.532 -14.436
  [5,24,-20,-10.51,-8.284,10,-10.51,-8.284,-20,-12.883,-1.648,-20,-7.532,-14.436],
// 5 24 -20 -7.532 -14.436 10 -7.532 -14.436 -20 -10.51 -8.284 -20 -4 -20
  [5,24,-20,-7.532,-14.436,10,-7.532,-14.436,-20,-10.51,-8.284,-20,-4,-20],
];
module ldraw_lib__15068p05(step=0, col=false, unit=2/5, alt=false, line=0.2, solid=!$preview)
    makepoly(ldraw_lib__15068p05(solid), step=step, col=col, unit=unit, alt=alt, line=line, solid=solid);
ldraw_lib__15068p05(line=0.2);
